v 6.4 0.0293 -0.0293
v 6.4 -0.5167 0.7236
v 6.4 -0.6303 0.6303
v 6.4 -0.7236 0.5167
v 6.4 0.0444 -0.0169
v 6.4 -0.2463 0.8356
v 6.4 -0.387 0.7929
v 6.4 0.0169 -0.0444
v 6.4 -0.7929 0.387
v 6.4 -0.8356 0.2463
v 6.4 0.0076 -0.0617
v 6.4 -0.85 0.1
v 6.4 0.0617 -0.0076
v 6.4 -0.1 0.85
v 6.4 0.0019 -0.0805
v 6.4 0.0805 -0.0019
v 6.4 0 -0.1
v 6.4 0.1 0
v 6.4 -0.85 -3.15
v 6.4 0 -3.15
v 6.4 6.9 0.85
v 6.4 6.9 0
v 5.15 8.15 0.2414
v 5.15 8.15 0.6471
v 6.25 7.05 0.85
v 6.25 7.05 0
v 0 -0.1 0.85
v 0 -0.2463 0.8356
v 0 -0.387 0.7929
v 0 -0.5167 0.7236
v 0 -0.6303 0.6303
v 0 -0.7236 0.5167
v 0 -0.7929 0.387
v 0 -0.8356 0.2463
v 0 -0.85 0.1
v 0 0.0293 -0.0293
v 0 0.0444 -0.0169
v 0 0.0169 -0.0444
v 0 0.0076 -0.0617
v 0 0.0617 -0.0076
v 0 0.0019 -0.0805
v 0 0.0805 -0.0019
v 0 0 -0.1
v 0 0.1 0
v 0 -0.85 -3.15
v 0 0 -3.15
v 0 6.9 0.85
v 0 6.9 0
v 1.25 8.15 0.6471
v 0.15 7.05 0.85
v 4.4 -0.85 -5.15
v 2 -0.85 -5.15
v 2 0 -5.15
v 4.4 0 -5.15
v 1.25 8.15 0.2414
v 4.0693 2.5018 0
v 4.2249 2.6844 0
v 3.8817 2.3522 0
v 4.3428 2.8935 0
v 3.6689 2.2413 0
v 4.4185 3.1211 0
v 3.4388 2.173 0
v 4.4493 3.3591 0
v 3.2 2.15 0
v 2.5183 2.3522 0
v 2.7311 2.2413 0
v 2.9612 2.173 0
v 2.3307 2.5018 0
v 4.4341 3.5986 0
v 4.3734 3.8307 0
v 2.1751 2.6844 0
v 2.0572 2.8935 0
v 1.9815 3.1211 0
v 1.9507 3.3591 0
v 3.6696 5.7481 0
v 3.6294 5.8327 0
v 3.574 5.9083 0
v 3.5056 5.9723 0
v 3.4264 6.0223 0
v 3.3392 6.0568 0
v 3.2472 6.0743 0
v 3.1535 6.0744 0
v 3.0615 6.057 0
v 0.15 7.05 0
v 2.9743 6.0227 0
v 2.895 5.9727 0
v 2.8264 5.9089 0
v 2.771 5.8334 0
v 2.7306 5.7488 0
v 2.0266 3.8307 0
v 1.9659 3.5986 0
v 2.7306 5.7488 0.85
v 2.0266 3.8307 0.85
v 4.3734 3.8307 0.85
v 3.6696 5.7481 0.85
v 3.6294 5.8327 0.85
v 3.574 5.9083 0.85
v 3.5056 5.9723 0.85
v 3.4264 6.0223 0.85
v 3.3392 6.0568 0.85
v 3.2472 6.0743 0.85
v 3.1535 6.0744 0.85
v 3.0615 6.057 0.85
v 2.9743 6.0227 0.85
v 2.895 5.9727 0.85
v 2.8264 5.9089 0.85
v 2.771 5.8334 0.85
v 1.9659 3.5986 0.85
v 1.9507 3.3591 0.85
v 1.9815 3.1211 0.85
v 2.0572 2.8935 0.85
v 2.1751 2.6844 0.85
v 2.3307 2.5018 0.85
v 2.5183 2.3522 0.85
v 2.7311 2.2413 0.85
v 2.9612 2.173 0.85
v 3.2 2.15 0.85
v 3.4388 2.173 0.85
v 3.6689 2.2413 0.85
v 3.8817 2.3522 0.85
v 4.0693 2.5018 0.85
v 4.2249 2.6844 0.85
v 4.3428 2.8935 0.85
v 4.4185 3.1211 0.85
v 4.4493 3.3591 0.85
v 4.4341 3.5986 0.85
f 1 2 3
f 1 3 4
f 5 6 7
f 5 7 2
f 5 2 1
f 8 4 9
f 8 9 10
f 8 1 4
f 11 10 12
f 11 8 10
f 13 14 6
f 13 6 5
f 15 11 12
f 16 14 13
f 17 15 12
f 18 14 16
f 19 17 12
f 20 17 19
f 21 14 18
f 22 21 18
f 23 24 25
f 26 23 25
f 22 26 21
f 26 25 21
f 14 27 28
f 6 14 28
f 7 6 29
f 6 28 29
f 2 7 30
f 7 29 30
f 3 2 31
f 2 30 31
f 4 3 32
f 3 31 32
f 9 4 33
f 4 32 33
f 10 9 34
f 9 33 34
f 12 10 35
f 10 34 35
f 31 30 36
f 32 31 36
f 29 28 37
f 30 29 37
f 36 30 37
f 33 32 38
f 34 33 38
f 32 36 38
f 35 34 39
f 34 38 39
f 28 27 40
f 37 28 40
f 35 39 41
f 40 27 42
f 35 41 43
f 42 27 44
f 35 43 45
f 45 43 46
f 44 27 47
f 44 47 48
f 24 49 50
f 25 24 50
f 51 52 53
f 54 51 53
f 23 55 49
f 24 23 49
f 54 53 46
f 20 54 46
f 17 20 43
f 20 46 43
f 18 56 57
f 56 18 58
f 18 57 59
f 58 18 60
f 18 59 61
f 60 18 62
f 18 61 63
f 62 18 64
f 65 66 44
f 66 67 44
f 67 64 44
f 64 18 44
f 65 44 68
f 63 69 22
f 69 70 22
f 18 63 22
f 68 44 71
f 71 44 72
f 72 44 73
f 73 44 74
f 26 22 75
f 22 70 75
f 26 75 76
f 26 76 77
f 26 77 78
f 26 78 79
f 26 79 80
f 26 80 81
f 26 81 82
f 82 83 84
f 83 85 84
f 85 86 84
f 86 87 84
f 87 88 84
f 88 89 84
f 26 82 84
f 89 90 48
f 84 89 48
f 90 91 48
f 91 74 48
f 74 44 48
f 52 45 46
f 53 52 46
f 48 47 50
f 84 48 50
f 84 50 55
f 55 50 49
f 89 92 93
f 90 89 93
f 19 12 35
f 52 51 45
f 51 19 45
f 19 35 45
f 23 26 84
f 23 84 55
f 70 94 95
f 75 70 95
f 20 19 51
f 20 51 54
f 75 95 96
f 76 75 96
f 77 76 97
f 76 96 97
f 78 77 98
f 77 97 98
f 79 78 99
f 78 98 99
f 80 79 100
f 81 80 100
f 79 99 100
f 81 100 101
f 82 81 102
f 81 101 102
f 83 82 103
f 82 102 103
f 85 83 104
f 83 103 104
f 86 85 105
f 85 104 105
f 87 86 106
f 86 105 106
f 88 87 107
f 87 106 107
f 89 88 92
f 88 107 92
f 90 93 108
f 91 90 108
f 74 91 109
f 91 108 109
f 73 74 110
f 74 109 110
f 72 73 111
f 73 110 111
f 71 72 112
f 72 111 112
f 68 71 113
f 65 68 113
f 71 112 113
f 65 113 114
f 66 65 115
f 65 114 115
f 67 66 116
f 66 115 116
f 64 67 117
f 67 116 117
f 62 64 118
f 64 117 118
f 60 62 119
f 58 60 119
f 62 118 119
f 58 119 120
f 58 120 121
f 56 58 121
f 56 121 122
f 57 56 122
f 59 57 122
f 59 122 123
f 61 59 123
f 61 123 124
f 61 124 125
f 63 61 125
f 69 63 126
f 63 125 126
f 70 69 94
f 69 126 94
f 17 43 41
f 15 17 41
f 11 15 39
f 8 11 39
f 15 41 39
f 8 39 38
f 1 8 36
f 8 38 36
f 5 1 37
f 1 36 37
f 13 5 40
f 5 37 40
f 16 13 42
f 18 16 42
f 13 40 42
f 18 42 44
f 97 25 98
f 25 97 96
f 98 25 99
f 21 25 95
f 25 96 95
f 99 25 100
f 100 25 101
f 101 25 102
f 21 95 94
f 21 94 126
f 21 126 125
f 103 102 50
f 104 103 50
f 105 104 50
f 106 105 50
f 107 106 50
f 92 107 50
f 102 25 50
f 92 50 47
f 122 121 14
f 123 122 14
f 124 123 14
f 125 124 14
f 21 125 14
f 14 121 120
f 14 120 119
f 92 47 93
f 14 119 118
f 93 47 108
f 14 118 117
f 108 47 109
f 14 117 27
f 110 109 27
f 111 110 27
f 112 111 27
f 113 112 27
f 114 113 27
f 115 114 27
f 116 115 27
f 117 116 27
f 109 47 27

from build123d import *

# Parameters (mm, degrees)
BOSS_EXTRUDE1_DEPTH = 6.4
CHAMFER3_SIZE       = 2
CUT_EXTRUDE1_DEPTH  = 0.85
CUT_EXTRUDE2_DEPTH  = 0.85


with BuildPart() as part:
    # Sketch1 → Boss-Extrude1 (new body)
    with BuildSketch(Plane(origin=(0, 0, 0), x_dir=(0, 0, -1), z_dir=(1, 0, 0))):
        with BuildLine():
            Line((0, 0.1), (0, 7.05))
            Line((0, 7.05), (-0.241393443, 8.15))
            Line((-0.241393443, 8.15), (-0.647131148, 8.15))
            Line((-0.647131148, 8.15), (-0.85, 7.05))
            Line((-0.85, 7.05), (-0.85, -0.1))
            ThreePointArc((-0.85, -0.1), (-0.630330086, -0.630330086), (-0.1, -0.85))
            Line((-0.1, -0.85), (5.15, -0.85))
            Line((5.15, -0.85), (5.15, 0))
            Line((5.15, 0), (0.1, 0))
            ThreePointArc((0.1, 0), (0.029289322, 0.029289322), (0, 0.1))
        make_face()
    extrude(amount=BOSS_EXTRUDE1_DEPTH)

    # Chamfer3
    chamfer3_edges = [part.edges().sort_by_distance(p)[0] for p in [
        (0, -0.425, -5.15),
        (6.4, -0.425, -5.15),
    ]]
    chamfer(chamfer3_edges, length=CHAMFER3_SIZE)

    # Sketch4 → Cut-Extrude1 (cut)
    with BuildSketch(Plane.XY.offset(0.85)):
        Polygon((0, 6.9), (1.25, 8.15), (0, 8.15), align=None)
        Polygon((5.15, 8.15), (6.4, 6.9), (6.4, 8.15), align=None)
    extrude(amount=-CUT_EXTRUDE1_DEPTH, mode=Mode.SUBTRACT)

    # Sketch5 → Cut-Extrude2 (cut)
    with BuildSketch(Plane.XY.offset(0.85)):
        with BuildLine():
            Line((2.730622244, 5.748829869), (2.026555611, 3.830729922))
            ThreePointArc((2.026555611, 3.830729922), (3.20000017, 2.15), (4.373444272, 3.830730241))
            Line((4.373444272, 3.830730241), (3.669633952, 5.748130298))
            ThreePointArc((3.669633952, 5.748130298), (3.200372504, 6.076537762), (2.730622244, 5.748829869))
        make_face()
    extrude(amount=-CUT_EXTRUDE2_DEPTH, mode=Mode.SUBTRACT)


solid = part.part
